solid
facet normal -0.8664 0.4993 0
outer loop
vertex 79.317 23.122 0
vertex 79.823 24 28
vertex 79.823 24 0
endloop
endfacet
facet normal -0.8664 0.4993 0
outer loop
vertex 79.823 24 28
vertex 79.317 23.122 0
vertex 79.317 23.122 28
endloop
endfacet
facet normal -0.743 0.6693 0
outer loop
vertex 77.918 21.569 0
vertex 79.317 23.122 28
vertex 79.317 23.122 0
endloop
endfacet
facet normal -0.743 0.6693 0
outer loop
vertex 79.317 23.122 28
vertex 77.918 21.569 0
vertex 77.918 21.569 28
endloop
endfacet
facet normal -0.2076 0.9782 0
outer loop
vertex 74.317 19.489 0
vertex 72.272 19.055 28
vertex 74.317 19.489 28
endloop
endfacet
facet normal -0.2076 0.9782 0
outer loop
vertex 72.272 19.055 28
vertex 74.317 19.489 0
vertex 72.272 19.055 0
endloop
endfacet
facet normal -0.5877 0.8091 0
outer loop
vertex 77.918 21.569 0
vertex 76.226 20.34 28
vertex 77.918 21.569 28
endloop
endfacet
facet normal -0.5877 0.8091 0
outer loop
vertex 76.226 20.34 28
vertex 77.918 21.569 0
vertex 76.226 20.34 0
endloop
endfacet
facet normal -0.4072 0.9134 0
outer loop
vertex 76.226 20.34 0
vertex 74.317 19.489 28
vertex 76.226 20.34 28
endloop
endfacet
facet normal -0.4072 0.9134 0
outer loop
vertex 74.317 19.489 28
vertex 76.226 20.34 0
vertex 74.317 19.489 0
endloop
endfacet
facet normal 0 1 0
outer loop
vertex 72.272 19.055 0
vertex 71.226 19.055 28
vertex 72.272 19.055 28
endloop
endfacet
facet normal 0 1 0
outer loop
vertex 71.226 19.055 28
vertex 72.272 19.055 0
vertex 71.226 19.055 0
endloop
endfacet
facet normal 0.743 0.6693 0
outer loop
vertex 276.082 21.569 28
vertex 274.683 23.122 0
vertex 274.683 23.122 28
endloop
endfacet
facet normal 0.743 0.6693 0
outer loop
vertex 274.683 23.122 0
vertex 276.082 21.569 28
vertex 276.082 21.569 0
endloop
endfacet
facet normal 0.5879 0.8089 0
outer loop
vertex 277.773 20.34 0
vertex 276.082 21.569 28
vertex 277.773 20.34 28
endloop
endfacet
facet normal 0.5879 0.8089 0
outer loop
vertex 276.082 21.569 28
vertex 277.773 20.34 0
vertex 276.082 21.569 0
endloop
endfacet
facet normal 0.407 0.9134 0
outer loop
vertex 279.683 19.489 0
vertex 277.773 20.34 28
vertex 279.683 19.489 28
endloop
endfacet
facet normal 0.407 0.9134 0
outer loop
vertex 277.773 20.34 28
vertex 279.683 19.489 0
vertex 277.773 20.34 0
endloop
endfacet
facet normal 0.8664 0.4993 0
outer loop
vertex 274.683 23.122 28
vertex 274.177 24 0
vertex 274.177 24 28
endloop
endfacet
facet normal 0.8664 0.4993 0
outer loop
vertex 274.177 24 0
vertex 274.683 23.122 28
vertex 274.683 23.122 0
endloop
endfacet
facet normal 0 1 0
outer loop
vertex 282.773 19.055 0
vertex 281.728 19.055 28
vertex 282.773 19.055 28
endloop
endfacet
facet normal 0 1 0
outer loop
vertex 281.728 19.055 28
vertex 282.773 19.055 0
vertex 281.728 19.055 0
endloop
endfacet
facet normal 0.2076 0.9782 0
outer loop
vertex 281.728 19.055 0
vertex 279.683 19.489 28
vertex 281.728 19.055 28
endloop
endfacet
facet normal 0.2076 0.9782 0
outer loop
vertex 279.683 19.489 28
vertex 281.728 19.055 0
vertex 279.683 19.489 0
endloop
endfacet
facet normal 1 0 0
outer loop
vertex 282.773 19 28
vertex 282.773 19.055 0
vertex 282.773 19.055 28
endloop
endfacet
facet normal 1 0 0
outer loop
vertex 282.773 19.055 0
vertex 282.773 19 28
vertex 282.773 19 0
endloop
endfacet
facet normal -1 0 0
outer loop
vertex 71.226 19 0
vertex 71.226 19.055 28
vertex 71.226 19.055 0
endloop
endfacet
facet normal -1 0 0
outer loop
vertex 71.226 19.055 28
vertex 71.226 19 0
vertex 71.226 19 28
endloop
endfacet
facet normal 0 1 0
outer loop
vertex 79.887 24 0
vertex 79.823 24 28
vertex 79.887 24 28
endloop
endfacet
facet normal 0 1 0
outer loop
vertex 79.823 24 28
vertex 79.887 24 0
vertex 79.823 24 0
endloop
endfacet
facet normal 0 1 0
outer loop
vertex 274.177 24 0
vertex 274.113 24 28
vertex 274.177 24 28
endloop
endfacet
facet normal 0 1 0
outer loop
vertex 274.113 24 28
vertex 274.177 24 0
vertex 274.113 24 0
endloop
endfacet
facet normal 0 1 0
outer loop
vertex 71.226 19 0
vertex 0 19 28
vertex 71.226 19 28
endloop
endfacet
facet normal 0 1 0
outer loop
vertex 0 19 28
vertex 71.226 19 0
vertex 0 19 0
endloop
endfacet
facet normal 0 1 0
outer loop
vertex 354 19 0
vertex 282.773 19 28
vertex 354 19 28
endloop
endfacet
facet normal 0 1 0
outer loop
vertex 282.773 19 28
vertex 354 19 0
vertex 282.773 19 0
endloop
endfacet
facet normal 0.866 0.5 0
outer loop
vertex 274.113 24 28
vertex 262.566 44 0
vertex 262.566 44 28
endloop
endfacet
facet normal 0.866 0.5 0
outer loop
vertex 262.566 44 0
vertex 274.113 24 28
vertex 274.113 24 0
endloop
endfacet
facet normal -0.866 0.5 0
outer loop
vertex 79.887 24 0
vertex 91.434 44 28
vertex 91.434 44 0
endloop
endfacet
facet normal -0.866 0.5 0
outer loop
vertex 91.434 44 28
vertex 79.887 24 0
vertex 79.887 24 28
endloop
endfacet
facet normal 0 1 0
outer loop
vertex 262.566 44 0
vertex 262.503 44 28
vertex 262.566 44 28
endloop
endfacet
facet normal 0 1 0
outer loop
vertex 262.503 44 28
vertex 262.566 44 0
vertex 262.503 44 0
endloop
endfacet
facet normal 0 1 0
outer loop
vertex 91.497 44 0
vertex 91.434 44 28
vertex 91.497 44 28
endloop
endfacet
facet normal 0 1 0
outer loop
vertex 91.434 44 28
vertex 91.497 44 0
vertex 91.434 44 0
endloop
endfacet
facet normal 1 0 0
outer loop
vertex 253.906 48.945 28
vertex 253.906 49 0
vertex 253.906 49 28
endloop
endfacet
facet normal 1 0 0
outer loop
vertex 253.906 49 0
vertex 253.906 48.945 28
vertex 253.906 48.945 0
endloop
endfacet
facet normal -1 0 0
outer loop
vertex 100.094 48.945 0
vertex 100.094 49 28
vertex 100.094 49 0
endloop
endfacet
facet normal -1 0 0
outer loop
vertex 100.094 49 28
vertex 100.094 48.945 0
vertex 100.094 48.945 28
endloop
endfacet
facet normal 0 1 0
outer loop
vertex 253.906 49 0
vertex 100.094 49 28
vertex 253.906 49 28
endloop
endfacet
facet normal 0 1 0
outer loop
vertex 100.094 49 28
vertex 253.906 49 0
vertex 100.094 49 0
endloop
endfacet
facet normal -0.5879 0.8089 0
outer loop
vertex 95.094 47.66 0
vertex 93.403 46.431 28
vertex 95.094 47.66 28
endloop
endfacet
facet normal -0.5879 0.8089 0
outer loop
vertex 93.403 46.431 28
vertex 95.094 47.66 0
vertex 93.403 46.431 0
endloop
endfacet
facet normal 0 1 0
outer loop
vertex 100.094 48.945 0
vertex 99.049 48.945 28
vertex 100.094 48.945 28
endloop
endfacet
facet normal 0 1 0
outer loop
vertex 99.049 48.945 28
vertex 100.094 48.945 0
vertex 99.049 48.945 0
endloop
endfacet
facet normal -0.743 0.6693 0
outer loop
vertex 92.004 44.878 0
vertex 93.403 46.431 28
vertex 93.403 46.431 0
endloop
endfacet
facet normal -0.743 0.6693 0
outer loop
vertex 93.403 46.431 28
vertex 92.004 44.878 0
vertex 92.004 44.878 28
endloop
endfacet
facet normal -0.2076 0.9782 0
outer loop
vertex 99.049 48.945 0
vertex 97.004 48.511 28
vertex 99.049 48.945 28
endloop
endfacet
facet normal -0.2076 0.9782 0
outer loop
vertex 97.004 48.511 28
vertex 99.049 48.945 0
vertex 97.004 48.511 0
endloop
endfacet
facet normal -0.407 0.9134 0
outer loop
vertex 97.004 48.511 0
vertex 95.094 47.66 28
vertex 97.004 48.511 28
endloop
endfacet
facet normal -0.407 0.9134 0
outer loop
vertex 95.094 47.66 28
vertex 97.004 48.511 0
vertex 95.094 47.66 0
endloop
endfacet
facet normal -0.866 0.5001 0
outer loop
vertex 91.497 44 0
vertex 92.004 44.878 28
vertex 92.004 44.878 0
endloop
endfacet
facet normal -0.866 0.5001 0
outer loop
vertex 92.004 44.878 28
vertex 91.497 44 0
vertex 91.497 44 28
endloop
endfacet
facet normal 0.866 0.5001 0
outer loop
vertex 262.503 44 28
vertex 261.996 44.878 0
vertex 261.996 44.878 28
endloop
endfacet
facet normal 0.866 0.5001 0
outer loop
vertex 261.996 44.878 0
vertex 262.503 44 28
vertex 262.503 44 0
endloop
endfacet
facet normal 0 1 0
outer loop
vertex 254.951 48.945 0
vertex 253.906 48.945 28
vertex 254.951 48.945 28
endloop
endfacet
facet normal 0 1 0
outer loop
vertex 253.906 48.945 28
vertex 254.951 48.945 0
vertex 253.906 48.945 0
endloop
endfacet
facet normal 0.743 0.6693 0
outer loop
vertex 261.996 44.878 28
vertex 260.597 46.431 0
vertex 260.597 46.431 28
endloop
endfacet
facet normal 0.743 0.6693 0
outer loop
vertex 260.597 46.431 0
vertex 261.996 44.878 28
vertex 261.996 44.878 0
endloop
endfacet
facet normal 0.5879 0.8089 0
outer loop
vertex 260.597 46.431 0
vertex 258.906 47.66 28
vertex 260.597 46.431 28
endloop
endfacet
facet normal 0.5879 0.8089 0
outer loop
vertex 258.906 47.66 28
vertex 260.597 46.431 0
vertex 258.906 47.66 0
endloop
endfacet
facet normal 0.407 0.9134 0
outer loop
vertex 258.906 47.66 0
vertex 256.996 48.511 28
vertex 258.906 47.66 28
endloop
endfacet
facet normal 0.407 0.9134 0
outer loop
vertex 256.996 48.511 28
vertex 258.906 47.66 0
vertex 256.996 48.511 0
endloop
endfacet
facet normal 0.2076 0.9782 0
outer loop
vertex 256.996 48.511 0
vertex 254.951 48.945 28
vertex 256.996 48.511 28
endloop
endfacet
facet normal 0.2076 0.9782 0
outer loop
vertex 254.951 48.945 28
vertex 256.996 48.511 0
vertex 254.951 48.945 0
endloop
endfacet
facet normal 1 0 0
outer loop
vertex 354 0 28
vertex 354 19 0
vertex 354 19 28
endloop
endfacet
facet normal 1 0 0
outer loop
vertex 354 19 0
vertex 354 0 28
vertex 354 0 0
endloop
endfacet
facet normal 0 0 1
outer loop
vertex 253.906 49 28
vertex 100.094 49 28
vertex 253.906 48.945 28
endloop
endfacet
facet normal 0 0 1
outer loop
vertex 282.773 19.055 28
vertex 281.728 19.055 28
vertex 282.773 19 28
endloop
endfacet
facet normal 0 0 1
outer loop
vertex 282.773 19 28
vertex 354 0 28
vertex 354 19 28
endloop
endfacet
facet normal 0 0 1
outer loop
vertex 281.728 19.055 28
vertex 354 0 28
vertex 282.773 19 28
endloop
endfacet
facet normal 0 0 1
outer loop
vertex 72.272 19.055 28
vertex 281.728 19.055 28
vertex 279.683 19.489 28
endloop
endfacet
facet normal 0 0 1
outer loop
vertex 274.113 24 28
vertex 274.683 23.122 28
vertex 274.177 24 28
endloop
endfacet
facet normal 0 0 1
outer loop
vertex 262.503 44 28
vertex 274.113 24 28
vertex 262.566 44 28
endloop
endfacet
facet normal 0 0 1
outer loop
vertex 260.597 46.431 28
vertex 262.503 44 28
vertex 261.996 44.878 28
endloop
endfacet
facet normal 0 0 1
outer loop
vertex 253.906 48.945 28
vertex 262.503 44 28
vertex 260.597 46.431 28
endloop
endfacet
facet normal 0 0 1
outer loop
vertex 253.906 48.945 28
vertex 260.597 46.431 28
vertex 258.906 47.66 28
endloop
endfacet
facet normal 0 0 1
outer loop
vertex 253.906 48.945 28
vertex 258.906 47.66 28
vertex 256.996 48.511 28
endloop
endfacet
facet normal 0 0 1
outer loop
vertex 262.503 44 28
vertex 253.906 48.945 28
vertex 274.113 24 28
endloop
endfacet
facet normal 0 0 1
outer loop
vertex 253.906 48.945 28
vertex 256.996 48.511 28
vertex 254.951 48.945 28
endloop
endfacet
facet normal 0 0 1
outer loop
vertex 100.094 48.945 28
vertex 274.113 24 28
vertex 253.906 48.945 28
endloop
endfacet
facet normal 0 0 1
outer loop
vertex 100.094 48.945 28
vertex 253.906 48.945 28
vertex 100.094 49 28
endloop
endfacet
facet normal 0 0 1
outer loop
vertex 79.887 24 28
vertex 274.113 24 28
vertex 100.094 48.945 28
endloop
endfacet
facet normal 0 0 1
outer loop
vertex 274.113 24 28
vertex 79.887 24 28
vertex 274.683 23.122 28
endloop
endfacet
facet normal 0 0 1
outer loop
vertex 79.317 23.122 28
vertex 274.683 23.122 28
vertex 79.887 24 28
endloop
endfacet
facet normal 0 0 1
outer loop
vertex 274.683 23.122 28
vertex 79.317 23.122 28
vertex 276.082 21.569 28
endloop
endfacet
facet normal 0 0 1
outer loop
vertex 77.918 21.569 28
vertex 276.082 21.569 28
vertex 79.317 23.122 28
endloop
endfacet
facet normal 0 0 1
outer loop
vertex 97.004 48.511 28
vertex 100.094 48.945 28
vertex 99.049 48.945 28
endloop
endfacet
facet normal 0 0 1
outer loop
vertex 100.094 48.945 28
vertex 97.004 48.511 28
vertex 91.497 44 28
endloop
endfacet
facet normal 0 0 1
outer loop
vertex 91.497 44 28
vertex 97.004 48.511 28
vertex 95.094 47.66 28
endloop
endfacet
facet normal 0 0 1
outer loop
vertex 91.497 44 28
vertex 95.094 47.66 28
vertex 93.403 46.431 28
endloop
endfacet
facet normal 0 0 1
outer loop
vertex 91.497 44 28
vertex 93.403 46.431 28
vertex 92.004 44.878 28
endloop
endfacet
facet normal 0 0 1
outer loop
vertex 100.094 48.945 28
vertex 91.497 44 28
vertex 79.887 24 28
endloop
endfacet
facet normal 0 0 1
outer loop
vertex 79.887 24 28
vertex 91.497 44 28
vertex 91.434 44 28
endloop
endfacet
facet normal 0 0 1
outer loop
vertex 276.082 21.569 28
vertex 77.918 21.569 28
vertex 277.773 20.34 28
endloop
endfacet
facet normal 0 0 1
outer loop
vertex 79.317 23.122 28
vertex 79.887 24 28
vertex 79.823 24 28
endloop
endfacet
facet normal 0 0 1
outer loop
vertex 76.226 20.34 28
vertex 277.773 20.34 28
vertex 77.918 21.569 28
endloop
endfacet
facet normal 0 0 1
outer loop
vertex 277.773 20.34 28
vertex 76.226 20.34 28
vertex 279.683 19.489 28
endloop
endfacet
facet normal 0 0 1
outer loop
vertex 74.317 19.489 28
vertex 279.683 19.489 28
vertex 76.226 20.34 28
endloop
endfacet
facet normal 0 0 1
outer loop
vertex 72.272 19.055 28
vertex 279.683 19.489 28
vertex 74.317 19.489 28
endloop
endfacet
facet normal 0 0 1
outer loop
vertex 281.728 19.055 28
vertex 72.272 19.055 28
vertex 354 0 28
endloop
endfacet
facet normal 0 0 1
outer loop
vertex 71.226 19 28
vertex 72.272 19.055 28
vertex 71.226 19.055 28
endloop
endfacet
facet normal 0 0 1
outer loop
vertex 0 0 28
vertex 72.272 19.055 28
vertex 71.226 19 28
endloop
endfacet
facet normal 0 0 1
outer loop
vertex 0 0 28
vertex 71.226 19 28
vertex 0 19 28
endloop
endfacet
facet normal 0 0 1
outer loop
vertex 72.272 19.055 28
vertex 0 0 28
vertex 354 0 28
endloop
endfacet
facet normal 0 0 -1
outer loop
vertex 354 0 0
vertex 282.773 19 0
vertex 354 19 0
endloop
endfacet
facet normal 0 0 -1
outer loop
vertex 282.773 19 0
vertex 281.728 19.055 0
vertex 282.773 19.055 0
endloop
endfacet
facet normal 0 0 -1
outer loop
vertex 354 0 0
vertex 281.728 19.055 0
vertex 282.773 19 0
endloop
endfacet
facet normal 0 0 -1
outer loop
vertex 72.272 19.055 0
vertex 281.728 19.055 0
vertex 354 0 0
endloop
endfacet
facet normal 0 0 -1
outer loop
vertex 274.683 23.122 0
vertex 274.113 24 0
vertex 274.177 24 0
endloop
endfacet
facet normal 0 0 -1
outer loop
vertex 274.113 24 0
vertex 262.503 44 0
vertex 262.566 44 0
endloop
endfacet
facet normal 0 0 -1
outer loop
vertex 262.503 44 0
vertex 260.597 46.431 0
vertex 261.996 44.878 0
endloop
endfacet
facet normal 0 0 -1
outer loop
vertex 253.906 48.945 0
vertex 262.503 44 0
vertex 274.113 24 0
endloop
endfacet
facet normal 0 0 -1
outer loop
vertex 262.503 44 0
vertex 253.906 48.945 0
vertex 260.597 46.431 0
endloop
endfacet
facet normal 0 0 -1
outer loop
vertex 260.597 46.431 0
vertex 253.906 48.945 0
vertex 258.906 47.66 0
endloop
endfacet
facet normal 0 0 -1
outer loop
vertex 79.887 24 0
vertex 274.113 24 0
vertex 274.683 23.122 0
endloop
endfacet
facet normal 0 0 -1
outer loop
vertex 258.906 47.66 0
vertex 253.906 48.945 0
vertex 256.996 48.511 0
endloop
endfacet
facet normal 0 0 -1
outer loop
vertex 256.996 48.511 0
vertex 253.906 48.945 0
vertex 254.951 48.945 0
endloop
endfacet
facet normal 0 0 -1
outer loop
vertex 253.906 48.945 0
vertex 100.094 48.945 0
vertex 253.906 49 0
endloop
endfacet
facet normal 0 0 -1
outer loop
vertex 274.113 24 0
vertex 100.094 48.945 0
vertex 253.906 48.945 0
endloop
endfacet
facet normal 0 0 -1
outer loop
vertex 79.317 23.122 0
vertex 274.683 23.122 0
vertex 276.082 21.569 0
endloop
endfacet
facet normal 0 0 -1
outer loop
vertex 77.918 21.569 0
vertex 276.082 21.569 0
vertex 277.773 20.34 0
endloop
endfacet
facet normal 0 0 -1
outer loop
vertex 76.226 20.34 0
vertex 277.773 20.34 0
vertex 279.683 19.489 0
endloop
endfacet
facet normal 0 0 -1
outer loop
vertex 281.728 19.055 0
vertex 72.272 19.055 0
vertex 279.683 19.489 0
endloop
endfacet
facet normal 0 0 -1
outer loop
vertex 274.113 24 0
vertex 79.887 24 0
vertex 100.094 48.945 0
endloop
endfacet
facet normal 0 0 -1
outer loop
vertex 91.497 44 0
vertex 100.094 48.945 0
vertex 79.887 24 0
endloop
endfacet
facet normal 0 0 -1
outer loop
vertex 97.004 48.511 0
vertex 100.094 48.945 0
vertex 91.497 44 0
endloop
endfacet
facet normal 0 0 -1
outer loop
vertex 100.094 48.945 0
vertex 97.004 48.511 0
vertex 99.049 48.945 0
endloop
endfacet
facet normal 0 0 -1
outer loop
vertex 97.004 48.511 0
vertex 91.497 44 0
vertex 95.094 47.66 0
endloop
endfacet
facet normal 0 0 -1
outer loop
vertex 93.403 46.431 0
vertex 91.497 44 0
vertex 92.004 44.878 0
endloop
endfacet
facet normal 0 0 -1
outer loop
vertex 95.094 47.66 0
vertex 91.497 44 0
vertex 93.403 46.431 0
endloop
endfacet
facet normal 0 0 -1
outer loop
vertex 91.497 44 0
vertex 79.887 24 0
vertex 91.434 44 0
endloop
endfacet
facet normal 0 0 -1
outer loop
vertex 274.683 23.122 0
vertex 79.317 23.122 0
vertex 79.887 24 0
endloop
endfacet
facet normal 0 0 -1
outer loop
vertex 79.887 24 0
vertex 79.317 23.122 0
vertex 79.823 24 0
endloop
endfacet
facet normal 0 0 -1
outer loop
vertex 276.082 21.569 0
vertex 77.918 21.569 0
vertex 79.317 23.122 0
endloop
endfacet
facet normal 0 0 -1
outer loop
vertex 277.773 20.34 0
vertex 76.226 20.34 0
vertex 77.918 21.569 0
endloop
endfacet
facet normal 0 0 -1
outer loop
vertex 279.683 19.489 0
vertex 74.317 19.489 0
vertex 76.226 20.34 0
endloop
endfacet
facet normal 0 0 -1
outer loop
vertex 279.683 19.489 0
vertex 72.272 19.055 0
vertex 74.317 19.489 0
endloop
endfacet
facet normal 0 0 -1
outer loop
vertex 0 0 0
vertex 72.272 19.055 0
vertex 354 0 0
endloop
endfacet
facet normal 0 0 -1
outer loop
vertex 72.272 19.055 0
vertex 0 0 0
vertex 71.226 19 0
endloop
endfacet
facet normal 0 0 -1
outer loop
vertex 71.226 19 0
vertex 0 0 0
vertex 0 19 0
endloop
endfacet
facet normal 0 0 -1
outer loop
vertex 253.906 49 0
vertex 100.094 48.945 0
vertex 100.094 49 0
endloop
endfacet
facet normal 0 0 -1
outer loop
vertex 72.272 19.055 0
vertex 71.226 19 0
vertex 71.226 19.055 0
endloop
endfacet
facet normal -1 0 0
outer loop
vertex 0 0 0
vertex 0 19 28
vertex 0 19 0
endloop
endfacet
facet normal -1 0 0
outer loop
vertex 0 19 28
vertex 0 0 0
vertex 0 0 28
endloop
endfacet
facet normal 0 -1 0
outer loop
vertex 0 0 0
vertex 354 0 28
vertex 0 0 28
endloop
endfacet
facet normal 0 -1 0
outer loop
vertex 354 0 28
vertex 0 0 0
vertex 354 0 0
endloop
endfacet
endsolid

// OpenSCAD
include <../src/wardrobe.scad>;
plank_yz_middle_top();
//github_openscad -o wardrobe_1/plank_yz_middle_top.stl -D wardrobe_n=1 -D cutting_edge=0 -D break_view_length=0 wardrobe_1/plank_yz_middle_top_stl.scad
